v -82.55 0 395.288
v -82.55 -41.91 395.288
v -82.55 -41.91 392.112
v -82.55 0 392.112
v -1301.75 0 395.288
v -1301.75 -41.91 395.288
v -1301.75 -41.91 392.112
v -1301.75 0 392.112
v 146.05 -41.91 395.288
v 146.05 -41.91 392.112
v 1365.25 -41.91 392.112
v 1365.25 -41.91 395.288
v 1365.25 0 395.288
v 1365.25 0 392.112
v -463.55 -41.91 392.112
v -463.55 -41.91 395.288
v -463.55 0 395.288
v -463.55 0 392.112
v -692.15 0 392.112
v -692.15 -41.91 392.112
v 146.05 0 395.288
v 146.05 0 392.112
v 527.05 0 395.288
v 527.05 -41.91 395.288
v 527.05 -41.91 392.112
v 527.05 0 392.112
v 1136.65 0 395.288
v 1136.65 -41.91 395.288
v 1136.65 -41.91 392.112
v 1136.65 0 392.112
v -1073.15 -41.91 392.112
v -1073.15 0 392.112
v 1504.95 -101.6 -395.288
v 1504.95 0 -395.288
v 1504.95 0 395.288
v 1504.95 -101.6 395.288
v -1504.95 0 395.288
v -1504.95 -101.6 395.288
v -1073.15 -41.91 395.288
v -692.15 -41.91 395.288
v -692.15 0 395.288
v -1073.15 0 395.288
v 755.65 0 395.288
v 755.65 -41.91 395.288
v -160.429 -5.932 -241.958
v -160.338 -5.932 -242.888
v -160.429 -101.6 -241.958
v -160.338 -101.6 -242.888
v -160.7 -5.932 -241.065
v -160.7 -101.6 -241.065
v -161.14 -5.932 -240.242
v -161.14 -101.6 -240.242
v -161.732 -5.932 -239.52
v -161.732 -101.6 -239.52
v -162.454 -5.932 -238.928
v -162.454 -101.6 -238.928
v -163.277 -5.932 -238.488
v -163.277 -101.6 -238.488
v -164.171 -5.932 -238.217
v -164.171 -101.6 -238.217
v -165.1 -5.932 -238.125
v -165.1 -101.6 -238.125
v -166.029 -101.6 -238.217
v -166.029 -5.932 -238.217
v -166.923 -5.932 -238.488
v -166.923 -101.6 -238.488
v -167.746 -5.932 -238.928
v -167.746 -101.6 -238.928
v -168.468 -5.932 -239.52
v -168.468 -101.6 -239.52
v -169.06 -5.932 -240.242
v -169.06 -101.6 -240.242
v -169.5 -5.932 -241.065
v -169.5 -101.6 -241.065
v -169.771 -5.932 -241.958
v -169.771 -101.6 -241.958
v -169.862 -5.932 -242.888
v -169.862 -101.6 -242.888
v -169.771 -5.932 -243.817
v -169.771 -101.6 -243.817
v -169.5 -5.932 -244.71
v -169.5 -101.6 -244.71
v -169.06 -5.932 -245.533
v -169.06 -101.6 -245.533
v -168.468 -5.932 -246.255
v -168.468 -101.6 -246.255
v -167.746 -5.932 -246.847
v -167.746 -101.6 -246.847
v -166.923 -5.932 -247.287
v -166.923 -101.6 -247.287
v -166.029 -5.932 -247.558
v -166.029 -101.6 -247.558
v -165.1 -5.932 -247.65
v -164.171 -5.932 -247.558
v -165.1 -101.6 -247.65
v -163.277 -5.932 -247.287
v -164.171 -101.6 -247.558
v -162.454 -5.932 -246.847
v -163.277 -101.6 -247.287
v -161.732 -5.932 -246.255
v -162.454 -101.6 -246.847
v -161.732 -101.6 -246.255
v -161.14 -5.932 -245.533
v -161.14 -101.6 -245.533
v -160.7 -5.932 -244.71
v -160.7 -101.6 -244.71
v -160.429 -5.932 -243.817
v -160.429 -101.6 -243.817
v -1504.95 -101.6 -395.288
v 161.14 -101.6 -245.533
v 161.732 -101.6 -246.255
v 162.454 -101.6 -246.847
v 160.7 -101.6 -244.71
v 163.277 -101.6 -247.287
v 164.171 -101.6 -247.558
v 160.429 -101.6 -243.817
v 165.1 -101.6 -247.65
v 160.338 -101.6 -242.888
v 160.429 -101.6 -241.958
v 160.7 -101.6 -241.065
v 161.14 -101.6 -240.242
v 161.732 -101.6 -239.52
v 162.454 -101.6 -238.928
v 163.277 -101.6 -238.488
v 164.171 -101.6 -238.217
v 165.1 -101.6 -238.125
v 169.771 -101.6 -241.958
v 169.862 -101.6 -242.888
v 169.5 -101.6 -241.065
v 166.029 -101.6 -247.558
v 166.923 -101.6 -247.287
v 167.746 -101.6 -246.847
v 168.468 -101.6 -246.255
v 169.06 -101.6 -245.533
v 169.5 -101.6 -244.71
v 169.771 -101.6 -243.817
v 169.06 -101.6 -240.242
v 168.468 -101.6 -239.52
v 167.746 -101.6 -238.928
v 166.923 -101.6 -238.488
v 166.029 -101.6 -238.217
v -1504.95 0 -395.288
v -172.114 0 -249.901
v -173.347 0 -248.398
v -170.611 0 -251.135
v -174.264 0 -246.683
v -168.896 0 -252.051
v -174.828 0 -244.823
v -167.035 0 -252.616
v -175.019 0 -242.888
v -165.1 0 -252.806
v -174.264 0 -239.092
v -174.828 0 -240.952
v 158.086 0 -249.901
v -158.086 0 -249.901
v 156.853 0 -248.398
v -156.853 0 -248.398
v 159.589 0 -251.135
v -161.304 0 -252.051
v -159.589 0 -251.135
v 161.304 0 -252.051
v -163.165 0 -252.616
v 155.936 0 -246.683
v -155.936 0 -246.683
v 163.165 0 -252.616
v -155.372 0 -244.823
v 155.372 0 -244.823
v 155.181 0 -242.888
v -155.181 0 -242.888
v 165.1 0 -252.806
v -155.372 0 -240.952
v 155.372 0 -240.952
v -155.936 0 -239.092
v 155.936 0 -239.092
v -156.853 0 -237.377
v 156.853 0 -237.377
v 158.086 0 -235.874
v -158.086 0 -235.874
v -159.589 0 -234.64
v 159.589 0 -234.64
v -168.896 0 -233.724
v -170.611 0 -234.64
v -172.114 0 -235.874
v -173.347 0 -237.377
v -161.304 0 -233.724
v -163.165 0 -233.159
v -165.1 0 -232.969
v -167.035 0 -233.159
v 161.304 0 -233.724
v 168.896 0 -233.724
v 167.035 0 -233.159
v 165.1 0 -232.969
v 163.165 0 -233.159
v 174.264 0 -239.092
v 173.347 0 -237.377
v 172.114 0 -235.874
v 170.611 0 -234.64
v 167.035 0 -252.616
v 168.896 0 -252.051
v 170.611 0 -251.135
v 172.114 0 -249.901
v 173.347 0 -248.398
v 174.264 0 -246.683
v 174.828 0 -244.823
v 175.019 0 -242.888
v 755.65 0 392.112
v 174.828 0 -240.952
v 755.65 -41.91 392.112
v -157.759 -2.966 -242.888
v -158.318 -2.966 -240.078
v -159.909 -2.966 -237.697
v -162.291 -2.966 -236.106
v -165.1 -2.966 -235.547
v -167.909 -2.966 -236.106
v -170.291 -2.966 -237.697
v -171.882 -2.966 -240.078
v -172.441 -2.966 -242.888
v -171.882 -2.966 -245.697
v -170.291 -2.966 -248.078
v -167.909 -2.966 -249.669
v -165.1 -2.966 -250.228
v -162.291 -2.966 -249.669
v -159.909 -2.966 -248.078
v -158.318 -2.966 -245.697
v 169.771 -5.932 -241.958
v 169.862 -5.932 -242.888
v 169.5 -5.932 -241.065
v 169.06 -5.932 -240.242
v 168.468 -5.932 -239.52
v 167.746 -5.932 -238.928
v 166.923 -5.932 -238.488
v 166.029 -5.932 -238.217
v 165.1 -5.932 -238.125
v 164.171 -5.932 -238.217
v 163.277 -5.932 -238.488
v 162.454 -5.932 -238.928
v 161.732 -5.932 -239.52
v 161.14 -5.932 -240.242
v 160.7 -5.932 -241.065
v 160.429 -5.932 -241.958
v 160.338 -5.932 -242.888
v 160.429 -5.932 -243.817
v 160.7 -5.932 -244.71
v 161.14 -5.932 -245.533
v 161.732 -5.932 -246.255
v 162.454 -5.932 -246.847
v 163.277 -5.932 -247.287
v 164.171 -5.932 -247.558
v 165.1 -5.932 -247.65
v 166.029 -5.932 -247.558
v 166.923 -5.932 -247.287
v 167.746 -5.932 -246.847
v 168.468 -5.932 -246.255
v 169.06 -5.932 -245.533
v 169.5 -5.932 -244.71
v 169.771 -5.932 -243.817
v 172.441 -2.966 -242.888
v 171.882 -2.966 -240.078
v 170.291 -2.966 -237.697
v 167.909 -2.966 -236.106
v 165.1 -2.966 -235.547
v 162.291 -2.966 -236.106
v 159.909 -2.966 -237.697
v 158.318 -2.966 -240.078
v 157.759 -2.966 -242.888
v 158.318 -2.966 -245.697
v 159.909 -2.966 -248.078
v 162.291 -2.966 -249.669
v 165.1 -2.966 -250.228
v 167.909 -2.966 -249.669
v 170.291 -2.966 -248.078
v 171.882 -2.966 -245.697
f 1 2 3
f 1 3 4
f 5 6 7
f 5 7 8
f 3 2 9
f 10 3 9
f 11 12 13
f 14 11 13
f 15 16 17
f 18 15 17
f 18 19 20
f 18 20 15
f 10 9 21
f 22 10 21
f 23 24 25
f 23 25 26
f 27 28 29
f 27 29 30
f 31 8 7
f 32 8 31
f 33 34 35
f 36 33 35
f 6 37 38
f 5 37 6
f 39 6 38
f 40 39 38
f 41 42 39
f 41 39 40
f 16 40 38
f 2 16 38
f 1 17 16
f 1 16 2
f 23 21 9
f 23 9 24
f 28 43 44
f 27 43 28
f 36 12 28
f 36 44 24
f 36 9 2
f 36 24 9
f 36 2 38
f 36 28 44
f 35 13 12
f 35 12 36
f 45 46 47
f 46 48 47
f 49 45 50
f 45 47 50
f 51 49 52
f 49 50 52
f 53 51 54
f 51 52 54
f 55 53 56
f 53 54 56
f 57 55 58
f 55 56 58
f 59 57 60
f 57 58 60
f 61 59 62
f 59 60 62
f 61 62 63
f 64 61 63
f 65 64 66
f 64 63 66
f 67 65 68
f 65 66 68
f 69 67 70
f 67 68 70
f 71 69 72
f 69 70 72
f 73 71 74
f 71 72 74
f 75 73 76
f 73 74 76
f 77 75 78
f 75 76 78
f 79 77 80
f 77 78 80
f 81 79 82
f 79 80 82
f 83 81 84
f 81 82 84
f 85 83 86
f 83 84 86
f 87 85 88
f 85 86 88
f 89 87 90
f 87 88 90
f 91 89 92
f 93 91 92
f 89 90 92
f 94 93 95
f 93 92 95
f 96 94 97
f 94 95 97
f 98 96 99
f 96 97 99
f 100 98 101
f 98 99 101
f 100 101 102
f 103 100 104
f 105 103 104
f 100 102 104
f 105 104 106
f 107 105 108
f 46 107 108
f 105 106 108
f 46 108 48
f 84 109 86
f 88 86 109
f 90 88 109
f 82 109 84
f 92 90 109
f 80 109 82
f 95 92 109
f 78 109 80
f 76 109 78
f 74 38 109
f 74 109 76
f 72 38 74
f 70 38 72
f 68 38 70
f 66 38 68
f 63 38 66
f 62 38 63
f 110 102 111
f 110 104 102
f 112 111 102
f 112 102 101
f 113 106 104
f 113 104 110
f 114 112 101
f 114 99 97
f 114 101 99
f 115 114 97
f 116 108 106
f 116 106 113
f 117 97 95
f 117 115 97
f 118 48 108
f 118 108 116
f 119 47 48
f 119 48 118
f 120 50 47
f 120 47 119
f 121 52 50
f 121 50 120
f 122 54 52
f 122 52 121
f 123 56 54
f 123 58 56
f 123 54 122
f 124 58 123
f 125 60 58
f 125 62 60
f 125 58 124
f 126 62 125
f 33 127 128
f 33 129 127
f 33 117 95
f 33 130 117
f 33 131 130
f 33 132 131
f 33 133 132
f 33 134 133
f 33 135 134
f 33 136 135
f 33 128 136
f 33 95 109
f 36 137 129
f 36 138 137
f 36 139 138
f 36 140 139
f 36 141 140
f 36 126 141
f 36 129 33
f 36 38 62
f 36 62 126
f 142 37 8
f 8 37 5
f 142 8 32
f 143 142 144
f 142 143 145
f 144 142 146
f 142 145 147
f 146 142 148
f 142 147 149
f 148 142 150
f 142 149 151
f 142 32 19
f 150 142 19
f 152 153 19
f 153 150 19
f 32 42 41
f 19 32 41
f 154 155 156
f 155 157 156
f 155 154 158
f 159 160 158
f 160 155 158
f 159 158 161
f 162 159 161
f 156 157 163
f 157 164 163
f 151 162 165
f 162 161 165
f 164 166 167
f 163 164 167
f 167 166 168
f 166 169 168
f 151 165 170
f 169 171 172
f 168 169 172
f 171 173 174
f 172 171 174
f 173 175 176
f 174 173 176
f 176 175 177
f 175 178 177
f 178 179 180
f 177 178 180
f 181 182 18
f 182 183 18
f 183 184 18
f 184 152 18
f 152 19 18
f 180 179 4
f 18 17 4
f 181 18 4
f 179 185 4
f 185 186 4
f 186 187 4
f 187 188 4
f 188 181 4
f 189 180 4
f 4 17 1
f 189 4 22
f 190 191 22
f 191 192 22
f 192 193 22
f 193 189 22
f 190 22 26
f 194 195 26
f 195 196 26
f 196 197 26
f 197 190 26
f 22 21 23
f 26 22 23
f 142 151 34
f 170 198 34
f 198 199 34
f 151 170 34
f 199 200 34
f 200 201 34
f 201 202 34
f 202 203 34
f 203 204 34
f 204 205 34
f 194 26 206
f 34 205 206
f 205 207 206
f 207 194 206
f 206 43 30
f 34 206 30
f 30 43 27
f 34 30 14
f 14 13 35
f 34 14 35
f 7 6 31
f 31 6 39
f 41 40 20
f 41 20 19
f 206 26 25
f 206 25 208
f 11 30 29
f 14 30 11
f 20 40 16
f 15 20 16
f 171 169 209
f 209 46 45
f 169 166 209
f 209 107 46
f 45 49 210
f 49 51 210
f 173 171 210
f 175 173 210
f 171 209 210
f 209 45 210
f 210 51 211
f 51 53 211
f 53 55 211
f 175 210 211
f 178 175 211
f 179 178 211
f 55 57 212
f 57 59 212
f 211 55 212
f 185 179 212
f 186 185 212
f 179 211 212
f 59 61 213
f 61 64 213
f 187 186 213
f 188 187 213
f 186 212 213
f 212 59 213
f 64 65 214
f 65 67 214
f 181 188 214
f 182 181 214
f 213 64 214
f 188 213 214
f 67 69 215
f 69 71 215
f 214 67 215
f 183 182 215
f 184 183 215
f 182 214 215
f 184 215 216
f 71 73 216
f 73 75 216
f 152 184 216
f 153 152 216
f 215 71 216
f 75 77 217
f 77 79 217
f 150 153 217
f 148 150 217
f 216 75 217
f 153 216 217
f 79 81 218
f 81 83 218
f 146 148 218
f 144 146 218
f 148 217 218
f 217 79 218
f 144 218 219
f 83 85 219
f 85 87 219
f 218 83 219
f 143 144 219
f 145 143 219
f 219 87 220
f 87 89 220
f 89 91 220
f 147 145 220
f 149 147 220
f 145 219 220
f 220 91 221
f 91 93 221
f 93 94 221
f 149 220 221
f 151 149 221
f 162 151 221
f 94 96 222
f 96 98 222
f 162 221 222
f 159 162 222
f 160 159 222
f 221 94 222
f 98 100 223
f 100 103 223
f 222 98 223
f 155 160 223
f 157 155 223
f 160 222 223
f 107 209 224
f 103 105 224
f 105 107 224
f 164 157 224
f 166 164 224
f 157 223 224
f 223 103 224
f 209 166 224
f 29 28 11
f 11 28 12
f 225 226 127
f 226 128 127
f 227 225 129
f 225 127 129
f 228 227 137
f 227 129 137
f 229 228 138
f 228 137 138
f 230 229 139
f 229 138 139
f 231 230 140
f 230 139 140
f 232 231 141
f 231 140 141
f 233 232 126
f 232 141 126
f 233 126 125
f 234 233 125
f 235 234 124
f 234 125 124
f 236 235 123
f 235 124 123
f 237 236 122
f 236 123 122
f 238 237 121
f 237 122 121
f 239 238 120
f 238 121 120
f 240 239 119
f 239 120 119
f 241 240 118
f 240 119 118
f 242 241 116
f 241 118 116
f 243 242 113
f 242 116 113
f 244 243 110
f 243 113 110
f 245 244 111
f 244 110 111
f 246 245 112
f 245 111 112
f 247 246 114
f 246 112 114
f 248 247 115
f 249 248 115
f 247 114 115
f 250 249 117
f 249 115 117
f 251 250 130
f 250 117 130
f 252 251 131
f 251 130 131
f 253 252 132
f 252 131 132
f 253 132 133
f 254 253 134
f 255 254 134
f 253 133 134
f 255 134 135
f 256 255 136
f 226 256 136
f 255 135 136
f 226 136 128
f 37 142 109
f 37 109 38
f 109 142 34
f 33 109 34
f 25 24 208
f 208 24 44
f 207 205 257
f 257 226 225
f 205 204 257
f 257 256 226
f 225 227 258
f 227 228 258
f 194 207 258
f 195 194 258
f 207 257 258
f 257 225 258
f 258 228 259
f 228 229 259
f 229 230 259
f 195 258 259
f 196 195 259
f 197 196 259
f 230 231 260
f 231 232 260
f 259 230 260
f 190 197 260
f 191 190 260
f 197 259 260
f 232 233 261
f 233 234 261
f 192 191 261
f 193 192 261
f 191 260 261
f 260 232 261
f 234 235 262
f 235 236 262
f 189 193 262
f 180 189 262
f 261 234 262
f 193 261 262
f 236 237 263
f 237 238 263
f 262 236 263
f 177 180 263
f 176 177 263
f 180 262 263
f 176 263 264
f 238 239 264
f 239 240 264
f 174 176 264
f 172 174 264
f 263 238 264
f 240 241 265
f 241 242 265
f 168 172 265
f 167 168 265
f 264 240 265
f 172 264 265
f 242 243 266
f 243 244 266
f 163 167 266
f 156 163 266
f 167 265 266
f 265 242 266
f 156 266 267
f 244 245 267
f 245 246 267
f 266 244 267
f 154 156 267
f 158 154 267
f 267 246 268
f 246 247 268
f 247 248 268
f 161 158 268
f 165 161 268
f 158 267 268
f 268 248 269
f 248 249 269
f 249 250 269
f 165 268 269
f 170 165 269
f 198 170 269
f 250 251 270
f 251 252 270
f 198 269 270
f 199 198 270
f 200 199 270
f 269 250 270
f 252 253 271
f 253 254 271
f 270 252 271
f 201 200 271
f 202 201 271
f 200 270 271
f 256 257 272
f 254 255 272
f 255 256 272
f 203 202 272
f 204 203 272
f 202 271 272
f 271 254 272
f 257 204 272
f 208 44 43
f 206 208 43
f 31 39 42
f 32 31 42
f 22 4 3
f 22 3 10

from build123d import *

# Parameters (mm, degrees)
F0_W           = 3009.9
F0_H           = 790.575
F1_DEPTH       = 101.6
F2_W           = 228.6
F2_H           = 41.91
F3_DEPTH       = 3.175
F5_D           = 9.525
F5_CSINK_D     = 19.8374
F5_CSINK_ANGLE = 82


with BuildPart() as f1:
    # F0 (on Front) → F1 (new body)
    with BuildSketch(Plane.XZ):
        Rectangle(F0_W, F0_H)
    extrude(amount=F1_DEPTH)

    # F2 (on face) → F3 (cut)
    with BuildSketch(Plane.XY.offset(395.2875)):
        with Locations((-1187.45, -20.955)):
            Rectangle(F2_W, F2_H)
        with Locations((-577.85, -20.955)):
            Rectangle(F2_W, F2_H)
        with Locations((31.75, -20.955)):
            Rectangle(F2_W, F2_H)
        with Locations((641.35, -20.955)):
            Rectangle(F2_W, F2_H)
        with Locations((1250.95, -20.955)):
            Rectangle(F2_W, F2_H)
    extrude(amount=-F3_DEPTH, mode=Mode.SUBTRACT)

    # F5 (through all)
    with Locations(Plane(origin=(0, 0, 0), x_dir=(-1, 0, 0), z_dir=(0, 1, 0))):
        with Locations((-165.1, -242.8875), (165.1, -242.8875)):
            CounterSinkHole(F5_D / 2, F5_CSINK_D / 2, counter_sink_angle=F5_CSINK_ANGLE)


solid = f1.part
